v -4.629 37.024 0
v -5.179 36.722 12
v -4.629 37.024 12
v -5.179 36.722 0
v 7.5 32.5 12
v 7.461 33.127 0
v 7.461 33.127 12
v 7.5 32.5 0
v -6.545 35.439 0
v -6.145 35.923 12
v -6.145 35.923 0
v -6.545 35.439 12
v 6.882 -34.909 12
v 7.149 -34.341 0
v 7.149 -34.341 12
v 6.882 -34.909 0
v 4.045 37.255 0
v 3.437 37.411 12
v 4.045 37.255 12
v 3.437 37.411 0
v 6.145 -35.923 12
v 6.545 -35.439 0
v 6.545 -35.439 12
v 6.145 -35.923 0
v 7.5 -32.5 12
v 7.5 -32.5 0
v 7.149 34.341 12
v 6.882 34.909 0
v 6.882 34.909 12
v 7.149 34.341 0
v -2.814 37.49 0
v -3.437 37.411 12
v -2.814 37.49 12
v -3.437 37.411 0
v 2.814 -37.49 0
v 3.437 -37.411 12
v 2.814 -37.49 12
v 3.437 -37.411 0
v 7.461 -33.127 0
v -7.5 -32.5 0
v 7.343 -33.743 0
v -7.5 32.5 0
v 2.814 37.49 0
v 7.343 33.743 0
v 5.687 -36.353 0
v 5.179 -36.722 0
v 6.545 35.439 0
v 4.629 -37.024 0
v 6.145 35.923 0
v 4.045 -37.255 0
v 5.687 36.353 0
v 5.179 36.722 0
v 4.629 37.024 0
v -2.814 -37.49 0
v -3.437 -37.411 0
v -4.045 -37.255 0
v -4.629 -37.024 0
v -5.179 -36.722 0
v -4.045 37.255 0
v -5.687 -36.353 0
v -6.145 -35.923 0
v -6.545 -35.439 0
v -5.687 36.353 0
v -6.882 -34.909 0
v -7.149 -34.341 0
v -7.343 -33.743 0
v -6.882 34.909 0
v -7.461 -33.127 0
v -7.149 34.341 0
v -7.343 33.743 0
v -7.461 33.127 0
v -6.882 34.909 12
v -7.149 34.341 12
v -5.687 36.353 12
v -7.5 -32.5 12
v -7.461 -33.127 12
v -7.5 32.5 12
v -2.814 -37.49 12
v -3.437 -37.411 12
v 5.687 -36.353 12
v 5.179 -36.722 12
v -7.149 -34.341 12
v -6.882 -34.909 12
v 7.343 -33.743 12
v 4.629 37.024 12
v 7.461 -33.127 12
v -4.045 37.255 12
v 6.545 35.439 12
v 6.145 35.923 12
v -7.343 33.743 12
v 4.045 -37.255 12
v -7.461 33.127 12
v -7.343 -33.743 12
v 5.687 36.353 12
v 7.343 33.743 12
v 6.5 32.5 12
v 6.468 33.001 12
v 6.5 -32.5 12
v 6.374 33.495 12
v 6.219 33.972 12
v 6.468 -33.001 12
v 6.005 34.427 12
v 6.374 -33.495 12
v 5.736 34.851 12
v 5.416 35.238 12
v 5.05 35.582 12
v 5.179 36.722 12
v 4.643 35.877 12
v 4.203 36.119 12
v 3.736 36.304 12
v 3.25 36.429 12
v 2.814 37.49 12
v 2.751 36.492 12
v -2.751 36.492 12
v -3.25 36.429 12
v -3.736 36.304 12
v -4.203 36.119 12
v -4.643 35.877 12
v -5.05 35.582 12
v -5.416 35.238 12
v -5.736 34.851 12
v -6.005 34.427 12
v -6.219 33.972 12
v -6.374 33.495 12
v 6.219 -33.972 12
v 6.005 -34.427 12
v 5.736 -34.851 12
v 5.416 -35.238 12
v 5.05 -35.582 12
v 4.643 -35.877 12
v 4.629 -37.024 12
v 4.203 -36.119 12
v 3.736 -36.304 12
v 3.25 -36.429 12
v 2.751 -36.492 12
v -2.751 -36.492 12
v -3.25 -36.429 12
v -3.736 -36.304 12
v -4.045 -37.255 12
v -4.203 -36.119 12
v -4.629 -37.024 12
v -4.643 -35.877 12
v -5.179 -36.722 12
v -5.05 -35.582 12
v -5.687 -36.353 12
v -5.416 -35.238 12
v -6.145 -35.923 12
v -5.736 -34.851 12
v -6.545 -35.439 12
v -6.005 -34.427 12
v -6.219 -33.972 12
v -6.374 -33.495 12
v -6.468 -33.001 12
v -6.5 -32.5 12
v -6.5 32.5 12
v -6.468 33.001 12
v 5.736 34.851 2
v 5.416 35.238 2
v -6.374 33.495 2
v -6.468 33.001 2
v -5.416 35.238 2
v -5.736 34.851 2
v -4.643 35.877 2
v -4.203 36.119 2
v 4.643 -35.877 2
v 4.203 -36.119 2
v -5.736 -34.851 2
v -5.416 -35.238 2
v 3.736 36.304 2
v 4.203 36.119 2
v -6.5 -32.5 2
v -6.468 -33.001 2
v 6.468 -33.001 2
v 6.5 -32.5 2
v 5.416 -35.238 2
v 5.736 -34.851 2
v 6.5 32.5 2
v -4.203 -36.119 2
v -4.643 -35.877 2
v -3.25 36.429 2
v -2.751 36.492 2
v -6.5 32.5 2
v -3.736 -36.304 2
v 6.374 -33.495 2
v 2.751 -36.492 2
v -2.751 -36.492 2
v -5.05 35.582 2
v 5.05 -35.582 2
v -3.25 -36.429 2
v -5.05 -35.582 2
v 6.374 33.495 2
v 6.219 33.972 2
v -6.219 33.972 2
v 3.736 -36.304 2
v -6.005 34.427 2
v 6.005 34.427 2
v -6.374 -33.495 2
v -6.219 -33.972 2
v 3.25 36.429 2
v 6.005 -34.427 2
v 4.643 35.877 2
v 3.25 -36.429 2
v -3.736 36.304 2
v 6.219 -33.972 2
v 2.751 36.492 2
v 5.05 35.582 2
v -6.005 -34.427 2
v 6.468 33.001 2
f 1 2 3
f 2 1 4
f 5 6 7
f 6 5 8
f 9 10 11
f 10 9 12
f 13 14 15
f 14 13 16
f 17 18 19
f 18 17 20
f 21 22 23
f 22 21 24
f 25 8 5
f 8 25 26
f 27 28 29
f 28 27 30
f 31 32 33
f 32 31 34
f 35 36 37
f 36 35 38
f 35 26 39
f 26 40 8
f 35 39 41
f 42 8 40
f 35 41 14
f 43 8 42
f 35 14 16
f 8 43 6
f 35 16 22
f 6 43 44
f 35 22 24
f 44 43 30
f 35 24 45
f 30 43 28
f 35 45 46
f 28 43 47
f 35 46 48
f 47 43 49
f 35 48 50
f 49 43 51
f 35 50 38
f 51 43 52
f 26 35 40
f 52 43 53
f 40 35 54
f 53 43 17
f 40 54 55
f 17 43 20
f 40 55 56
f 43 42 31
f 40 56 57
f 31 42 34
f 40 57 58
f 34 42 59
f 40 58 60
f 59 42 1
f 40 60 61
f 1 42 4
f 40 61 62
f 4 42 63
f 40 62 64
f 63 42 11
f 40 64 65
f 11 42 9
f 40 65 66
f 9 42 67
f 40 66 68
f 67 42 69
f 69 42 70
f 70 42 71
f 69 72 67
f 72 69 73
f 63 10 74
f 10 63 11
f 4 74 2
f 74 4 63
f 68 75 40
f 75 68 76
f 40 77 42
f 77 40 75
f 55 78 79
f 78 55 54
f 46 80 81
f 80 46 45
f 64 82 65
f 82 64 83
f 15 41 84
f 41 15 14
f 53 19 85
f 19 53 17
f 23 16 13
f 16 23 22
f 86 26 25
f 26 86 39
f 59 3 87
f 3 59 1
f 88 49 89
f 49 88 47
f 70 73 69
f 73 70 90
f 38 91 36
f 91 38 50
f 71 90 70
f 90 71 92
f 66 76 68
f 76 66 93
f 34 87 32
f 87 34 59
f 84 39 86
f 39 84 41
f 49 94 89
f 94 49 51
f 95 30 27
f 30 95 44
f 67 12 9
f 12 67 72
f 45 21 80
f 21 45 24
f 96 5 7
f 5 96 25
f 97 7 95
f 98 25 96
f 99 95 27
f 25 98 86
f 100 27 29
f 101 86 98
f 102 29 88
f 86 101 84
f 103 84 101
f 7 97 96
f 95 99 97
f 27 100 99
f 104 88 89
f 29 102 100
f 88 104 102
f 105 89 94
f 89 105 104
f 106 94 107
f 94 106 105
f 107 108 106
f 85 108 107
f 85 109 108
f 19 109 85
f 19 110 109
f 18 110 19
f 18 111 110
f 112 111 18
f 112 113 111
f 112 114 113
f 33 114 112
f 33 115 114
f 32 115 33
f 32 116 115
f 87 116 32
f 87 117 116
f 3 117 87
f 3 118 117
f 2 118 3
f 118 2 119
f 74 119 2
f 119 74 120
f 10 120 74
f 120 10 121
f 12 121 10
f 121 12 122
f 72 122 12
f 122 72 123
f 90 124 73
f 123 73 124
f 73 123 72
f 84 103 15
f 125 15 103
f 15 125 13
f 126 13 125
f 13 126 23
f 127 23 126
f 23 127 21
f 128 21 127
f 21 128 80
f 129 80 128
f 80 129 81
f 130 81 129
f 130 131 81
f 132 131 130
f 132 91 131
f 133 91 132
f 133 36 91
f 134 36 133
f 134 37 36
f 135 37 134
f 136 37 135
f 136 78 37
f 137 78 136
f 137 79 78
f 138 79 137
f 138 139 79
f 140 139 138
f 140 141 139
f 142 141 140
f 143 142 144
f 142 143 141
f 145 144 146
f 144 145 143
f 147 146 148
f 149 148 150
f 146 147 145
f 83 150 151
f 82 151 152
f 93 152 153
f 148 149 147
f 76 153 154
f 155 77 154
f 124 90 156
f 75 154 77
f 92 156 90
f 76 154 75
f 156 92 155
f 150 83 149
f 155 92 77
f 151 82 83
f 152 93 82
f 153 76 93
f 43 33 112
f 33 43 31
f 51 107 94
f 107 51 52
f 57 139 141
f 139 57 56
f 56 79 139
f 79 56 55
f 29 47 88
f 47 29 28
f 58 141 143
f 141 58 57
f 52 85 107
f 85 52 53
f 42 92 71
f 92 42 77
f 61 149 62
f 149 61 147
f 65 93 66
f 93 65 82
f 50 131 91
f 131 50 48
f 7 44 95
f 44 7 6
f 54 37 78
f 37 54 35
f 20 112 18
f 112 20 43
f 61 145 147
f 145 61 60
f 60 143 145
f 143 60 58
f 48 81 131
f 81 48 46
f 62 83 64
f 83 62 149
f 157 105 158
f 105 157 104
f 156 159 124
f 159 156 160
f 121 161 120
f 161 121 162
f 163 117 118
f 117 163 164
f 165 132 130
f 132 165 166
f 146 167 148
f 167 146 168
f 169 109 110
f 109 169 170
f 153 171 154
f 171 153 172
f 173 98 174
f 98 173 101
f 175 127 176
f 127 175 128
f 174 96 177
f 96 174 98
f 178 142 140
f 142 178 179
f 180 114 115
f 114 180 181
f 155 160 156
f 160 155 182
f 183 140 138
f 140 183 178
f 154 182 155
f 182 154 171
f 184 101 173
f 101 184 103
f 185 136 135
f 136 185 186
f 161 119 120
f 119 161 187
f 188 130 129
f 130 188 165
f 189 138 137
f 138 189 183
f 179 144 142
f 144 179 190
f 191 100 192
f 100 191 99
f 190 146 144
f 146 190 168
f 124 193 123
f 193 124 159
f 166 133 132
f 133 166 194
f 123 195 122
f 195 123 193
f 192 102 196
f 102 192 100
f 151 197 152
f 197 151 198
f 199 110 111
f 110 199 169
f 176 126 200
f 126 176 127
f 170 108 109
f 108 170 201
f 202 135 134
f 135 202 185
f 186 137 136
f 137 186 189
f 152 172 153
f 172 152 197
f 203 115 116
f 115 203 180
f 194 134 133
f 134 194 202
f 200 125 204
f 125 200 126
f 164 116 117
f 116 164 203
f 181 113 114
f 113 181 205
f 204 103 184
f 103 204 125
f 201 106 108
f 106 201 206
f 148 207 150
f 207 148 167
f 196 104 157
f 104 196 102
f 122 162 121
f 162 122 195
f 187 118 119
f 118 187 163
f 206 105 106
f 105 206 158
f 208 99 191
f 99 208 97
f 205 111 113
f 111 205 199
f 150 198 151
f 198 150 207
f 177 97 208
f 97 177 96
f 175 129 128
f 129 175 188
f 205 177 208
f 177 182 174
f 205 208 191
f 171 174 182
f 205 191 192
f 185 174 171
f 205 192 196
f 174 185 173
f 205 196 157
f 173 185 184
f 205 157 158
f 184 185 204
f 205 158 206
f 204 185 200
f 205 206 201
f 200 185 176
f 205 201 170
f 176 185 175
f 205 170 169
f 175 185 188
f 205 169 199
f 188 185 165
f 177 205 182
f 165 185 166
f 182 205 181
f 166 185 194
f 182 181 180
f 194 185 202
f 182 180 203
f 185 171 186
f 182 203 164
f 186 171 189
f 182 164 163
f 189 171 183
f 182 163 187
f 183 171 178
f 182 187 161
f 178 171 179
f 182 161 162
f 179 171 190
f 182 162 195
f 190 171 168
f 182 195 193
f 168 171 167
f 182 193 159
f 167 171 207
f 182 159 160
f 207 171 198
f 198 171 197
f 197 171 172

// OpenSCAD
$fn = 50;


difference() {
	union() {
		hull() {
			translate(v = [-2.5000000000, 32.5000000000, 0]) {
				cylinder(h = 12, r = 5);
			}
			translate(v = [2.5000000000, 32.5000000000, 0]) {
				cylinder(h = 12, r = 5);
			}
			translate(v = [-2.5000000000, -32.5000000000, 0]) {
				cylinder(h = 12, r = 5);
			}
			translate(v = [2.5000000000, -32.5000000000, 0]) {
				cylinder(h = 12, r = 5);
			}
		}
	}
	union() {
		translate(v = [0, 0, 2]) {
			hull() {
				translate(v = [-2.5000000000, 32.5000000000, 0]) {
					cylinder(h = 10, r = 4);
				}
				translate(v = [2.5000000000, 32.5000000000, 0]) {
					cylinder(h = 10, r = 4);
				}
				translate(v = [-2.5000000000, -32.5000000000, 0]) {
					cylinder(h = 10, r = 4);
				}
				translate(v = [2.5000000000, -32.5000000000, 0]) {
					cylinder(h = 10, r = 4);
				}
			}
		}
	}
}
